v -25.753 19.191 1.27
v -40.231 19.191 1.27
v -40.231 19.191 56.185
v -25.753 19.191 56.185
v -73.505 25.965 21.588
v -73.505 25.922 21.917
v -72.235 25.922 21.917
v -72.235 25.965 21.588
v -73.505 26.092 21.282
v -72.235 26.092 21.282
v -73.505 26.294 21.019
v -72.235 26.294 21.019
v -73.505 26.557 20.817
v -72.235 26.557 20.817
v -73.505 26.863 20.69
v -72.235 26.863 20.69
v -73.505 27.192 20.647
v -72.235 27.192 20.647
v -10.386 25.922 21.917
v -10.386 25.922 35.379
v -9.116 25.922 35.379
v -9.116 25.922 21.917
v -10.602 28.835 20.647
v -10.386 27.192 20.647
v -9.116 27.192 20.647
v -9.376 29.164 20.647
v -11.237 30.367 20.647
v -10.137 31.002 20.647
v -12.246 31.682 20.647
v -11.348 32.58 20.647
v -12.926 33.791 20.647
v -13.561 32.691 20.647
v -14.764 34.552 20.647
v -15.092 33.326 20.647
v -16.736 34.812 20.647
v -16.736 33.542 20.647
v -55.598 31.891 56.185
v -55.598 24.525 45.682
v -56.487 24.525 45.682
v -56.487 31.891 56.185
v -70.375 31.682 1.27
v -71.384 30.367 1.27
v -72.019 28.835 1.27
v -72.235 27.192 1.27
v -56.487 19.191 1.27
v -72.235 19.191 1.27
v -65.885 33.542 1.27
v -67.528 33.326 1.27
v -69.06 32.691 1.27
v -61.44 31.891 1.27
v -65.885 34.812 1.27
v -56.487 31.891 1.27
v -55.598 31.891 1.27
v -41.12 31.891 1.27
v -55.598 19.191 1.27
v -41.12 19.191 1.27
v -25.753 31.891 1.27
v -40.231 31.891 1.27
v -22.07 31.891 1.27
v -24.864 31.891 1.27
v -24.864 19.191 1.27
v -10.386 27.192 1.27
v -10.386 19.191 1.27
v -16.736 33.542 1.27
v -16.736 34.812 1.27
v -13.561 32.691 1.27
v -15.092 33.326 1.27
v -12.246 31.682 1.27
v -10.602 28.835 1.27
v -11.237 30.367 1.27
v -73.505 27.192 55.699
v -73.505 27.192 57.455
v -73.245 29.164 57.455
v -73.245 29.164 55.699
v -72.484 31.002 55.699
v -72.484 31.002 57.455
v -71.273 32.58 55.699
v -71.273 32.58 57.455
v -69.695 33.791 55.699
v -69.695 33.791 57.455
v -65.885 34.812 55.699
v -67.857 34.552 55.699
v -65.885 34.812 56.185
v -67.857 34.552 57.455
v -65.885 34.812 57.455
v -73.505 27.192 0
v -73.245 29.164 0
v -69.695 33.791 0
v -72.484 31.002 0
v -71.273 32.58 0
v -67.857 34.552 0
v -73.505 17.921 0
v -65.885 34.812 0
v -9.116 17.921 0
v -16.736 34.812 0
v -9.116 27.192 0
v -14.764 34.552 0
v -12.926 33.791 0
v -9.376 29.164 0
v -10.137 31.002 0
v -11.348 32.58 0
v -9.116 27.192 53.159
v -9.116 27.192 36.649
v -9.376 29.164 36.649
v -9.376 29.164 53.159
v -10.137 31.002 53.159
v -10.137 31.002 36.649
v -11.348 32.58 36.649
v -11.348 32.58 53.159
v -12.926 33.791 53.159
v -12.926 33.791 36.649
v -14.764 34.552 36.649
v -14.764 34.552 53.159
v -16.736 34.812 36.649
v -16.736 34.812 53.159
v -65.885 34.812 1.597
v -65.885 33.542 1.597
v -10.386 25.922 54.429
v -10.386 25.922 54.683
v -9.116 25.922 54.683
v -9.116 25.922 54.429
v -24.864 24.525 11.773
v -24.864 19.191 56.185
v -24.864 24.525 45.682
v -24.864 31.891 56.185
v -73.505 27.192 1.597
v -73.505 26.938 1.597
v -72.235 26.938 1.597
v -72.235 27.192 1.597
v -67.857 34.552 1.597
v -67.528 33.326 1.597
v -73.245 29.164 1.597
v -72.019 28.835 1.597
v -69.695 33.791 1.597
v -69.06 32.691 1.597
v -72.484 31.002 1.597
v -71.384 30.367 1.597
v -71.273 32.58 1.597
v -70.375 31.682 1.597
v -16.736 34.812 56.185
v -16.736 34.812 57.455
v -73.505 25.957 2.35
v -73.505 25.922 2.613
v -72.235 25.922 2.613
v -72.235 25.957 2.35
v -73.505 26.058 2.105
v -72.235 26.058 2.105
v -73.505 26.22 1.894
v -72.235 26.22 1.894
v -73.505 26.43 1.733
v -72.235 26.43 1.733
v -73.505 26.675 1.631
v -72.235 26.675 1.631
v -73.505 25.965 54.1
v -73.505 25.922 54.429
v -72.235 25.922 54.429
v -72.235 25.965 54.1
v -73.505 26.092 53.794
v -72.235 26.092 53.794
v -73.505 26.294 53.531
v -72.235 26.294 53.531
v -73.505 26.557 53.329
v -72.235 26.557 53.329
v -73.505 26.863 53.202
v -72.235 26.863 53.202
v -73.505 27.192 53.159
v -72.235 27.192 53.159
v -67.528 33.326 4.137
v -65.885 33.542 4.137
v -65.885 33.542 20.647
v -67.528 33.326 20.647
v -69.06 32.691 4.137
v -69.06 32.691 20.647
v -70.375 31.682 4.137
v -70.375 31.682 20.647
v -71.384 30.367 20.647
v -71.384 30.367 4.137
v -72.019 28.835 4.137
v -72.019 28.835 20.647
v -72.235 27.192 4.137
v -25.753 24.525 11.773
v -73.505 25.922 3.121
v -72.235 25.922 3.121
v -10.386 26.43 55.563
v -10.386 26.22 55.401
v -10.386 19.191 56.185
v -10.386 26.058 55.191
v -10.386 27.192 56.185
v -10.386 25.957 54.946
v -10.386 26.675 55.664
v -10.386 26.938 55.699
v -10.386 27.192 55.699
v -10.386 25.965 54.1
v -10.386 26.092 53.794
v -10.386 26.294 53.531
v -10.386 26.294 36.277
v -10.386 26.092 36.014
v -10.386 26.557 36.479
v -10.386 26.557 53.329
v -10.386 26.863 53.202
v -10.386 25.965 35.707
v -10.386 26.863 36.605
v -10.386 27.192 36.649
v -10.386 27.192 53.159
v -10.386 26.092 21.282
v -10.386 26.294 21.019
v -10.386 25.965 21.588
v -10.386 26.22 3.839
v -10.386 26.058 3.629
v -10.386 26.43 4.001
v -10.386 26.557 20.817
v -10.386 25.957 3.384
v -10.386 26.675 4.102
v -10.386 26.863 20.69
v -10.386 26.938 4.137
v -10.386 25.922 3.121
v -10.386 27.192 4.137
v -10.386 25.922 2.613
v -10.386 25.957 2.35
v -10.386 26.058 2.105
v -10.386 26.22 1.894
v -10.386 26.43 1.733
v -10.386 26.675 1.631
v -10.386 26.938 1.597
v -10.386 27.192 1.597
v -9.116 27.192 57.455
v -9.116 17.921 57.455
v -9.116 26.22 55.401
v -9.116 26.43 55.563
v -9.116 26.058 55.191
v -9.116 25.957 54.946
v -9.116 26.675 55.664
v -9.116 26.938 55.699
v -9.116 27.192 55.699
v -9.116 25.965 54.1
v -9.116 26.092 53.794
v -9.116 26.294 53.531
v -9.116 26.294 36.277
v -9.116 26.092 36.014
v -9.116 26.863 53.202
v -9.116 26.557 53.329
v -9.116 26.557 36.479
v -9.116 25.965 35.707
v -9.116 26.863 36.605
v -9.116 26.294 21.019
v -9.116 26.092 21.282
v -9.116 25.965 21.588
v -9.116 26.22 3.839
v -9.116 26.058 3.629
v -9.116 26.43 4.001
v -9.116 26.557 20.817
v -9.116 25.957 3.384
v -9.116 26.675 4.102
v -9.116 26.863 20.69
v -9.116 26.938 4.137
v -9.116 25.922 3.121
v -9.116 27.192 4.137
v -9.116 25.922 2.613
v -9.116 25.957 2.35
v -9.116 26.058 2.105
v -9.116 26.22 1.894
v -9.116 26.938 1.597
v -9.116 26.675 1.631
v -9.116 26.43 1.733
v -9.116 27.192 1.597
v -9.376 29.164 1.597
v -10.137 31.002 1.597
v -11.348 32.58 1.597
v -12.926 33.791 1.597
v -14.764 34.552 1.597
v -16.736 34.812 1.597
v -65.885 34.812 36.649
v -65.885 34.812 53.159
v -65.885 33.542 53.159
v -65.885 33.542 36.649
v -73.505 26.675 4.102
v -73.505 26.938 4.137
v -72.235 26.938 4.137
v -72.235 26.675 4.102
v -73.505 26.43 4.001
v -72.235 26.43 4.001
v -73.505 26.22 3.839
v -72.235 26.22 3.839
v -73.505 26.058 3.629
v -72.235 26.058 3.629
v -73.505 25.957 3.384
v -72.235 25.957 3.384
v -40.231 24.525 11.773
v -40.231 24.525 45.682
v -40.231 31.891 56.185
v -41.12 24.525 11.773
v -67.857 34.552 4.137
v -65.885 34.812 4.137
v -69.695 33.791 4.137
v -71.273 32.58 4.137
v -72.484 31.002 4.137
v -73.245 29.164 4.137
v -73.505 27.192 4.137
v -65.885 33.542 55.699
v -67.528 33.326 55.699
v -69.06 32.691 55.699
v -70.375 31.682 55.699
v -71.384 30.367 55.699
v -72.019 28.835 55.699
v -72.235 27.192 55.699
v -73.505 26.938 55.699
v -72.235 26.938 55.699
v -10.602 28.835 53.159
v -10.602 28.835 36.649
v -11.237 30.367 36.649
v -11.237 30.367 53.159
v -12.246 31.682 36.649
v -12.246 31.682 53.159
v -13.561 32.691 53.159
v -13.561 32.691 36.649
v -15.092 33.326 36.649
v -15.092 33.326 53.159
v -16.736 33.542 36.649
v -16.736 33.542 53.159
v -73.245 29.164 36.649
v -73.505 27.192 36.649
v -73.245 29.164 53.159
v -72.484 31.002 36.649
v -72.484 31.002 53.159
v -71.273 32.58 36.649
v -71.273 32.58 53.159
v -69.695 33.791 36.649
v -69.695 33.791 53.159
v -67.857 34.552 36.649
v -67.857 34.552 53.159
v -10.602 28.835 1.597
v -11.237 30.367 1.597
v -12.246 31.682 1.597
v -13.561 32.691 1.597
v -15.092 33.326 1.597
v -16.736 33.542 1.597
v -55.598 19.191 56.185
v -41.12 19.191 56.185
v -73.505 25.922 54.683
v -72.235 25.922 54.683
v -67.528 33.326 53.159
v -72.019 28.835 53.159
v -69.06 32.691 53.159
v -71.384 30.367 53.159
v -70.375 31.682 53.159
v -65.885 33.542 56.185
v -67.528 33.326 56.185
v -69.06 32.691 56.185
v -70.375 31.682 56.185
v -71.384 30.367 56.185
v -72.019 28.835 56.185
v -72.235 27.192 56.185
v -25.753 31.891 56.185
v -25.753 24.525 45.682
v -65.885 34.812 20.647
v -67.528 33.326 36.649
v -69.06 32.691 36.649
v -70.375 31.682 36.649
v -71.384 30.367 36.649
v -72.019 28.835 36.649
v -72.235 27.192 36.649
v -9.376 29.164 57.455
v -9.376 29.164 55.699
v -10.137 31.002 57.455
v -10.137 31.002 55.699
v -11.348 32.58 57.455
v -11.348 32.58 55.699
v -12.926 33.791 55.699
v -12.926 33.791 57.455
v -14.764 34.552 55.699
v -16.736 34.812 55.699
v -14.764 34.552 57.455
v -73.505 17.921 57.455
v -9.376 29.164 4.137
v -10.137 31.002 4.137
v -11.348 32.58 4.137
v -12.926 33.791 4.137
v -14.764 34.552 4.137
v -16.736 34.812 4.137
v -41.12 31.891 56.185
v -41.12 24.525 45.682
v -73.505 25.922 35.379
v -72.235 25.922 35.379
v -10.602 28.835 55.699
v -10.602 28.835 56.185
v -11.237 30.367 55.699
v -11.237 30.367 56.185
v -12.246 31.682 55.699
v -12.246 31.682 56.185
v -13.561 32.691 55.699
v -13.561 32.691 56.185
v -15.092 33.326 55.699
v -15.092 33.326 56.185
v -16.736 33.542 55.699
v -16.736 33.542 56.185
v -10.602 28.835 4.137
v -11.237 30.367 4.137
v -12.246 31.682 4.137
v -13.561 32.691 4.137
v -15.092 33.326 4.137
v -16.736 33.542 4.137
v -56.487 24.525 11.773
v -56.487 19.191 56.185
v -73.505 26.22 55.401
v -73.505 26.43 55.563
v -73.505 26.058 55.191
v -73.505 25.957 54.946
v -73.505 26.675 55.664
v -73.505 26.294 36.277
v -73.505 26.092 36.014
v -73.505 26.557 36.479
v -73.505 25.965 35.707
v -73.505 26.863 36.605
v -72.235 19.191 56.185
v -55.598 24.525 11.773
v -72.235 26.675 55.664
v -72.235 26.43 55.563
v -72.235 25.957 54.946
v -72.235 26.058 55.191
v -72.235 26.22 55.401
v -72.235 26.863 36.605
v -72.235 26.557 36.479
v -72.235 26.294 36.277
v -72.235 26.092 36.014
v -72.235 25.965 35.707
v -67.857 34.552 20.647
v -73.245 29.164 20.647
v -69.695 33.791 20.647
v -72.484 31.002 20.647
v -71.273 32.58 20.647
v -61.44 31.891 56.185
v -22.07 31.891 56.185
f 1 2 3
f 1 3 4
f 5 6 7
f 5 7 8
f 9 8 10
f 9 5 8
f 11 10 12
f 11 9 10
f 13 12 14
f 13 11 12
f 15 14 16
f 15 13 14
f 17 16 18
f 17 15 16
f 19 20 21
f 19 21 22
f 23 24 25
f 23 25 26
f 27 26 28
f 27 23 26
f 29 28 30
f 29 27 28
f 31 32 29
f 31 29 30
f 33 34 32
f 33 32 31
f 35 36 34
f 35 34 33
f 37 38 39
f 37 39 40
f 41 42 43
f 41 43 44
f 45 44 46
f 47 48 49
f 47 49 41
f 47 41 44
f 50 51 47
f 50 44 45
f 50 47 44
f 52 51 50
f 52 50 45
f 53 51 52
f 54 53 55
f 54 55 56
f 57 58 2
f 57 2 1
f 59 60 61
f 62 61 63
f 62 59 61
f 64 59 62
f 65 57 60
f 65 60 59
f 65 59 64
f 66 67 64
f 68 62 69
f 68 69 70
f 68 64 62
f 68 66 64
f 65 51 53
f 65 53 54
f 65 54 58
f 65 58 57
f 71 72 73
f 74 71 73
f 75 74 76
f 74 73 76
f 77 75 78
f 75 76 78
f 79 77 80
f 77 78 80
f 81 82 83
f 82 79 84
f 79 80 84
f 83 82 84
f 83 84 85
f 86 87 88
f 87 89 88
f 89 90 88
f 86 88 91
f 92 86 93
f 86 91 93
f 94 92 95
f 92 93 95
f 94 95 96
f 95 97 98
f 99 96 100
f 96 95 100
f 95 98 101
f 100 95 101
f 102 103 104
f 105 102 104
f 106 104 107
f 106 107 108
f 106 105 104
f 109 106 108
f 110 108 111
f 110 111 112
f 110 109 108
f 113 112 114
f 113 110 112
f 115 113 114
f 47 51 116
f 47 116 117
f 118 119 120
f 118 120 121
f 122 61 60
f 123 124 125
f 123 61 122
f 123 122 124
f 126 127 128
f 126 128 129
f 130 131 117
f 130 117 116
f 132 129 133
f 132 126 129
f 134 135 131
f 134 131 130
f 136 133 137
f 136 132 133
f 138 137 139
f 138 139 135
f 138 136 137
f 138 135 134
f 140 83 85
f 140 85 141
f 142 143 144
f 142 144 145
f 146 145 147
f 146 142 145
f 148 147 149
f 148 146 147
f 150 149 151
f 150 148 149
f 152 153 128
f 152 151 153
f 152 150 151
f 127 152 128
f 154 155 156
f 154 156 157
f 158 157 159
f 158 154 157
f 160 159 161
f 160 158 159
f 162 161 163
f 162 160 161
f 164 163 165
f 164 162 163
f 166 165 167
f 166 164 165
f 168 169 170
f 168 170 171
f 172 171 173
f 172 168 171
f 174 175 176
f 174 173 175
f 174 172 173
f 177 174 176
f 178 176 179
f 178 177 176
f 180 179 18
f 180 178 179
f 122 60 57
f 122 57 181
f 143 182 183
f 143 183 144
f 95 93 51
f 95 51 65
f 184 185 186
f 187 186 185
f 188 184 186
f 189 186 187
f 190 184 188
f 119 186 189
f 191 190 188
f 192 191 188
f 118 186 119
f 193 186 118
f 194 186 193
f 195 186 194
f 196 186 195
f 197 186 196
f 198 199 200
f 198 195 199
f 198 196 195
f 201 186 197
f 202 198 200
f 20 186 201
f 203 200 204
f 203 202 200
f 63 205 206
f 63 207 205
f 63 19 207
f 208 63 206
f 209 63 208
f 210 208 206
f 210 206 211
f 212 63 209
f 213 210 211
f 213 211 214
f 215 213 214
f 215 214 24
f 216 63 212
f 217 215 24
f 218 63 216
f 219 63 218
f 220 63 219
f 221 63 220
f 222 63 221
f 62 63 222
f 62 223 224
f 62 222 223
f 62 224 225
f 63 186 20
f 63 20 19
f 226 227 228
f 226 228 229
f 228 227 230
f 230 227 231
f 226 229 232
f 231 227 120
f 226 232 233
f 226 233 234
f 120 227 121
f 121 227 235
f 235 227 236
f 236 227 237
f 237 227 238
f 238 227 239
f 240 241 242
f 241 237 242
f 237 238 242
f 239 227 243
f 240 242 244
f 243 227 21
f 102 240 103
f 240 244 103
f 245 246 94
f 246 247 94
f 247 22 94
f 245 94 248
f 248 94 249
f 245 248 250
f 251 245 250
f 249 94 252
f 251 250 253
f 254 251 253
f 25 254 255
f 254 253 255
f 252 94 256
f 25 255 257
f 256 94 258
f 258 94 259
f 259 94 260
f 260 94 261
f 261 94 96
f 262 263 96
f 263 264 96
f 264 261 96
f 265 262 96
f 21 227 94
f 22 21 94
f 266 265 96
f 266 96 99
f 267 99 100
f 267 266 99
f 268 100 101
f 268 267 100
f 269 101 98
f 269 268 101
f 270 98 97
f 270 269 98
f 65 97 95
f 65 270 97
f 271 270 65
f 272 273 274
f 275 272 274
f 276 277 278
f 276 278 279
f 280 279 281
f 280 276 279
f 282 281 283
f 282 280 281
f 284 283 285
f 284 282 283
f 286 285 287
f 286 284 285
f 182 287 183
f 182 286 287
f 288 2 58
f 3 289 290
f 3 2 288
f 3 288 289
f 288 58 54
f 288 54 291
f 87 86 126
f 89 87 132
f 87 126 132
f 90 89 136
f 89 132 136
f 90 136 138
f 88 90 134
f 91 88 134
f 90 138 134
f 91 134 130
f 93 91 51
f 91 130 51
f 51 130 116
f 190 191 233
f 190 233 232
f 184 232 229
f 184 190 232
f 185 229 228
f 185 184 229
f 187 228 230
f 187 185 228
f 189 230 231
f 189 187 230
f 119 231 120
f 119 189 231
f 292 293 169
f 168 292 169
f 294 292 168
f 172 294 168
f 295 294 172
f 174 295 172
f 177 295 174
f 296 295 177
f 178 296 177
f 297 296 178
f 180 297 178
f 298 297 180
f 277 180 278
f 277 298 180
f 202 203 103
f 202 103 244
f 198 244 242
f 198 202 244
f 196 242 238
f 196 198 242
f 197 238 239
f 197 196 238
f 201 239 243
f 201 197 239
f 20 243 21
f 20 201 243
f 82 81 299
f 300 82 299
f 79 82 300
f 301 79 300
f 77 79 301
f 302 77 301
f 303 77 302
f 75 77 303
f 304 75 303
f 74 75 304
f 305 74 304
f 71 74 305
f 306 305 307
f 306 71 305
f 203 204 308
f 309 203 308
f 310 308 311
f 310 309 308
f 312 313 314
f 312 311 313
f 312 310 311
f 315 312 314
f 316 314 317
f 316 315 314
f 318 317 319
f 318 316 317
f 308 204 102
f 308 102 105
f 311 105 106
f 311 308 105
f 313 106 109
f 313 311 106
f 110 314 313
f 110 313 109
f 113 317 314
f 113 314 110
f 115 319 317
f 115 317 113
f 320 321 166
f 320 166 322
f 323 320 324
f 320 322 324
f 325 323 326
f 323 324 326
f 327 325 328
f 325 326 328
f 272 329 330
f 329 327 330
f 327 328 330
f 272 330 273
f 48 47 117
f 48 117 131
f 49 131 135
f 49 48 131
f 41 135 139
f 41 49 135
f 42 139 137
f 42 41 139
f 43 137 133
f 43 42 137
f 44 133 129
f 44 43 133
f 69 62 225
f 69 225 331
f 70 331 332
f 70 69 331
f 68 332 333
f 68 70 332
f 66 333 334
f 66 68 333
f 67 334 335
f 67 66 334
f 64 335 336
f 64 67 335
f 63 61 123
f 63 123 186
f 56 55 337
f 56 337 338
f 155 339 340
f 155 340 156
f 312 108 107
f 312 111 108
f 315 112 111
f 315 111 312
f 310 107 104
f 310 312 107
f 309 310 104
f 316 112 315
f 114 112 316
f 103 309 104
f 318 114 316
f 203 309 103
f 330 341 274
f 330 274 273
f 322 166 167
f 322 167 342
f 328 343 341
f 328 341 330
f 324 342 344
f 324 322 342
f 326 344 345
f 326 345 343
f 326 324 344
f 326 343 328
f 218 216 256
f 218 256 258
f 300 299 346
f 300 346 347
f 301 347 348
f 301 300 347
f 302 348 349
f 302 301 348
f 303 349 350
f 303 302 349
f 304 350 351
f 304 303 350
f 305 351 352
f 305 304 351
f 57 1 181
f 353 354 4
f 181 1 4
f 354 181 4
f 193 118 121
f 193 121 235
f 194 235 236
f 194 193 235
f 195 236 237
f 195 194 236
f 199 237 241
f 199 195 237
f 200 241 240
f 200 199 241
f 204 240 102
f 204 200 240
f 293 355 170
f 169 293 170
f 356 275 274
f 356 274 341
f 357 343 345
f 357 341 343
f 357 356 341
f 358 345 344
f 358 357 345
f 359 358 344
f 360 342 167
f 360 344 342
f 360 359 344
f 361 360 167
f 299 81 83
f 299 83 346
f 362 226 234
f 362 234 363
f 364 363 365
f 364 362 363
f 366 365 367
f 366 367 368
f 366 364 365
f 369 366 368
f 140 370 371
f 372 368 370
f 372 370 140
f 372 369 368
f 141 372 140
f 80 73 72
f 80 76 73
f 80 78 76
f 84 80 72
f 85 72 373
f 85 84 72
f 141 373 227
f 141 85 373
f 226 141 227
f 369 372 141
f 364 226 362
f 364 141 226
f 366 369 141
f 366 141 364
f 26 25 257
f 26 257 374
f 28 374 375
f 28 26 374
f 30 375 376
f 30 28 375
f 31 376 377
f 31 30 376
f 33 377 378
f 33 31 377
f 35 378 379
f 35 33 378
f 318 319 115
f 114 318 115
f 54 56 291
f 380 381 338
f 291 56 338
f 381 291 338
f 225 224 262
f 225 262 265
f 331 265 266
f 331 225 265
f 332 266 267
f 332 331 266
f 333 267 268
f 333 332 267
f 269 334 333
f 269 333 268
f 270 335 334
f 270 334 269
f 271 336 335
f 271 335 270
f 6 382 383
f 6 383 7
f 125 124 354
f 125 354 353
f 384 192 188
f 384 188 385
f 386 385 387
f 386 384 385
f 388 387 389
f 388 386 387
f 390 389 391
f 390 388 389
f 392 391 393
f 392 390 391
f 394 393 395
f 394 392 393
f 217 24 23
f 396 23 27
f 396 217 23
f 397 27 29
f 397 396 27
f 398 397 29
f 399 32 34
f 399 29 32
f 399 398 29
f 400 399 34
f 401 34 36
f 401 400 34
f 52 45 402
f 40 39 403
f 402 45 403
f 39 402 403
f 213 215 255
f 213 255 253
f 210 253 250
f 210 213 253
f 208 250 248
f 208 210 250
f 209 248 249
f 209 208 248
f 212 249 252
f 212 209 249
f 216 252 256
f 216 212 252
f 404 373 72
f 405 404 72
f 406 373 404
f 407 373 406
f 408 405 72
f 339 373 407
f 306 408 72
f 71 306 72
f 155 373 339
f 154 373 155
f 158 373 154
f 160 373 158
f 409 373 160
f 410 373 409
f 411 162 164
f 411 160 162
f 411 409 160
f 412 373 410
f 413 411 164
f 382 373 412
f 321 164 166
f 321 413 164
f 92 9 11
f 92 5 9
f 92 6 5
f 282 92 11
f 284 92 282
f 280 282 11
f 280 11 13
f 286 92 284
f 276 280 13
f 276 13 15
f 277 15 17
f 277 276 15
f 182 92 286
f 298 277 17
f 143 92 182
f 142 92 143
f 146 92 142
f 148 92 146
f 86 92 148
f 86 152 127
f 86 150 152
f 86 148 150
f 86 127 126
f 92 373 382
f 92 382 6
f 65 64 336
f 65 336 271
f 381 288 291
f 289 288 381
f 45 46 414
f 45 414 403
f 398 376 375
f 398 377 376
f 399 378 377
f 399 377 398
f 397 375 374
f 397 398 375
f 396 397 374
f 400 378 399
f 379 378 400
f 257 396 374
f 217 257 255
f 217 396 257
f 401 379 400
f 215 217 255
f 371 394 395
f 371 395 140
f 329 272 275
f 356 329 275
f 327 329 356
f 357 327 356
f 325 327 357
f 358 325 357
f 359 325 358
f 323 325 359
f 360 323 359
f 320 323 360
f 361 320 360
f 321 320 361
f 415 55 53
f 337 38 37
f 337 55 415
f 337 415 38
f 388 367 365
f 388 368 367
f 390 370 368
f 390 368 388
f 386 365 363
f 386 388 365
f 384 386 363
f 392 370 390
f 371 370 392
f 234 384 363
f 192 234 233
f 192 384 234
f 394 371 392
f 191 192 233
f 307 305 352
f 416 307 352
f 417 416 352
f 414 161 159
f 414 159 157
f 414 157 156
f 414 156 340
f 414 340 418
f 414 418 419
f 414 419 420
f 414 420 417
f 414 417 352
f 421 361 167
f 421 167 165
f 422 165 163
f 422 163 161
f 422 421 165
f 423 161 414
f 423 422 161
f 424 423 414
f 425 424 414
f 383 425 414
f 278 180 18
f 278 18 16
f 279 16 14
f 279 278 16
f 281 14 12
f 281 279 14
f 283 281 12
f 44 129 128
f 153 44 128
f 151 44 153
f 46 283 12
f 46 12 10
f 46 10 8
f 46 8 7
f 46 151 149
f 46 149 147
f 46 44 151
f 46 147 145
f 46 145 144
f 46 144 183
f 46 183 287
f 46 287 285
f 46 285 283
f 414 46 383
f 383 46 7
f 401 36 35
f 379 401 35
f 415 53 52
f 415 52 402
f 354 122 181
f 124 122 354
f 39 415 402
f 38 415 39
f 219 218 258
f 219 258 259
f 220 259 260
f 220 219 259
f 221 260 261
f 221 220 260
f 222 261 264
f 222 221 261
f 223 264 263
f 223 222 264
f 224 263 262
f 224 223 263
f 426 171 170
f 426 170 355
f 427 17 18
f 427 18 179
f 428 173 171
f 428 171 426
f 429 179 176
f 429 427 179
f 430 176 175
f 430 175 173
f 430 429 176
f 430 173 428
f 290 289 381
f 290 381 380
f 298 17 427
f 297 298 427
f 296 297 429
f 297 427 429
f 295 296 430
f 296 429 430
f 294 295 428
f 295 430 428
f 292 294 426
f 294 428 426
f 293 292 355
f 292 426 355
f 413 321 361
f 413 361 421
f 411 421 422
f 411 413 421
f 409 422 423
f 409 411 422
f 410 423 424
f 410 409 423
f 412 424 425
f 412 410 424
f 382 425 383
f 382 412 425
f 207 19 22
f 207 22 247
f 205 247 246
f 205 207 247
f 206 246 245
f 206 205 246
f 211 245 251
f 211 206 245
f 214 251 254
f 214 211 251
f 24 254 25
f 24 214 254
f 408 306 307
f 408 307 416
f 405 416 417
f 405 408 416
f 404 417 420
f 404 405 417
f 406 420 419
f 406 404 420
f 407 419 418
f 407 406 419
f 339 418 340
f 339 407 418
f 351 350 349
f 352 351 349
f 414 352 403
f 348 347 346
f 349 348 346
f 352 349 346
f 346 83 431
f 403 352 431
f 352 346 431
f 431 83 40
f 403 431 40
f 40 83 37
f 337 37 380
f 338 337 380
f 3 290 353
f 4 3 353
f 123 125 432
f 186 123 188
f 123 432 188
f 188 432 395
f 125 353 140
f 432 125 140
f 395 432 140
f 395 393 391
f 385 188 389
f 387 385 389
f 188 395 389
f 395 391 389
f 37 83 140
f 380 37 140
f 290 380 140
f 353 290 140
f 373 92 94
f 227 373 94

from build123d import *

# Parameters (mm, degrees)
SKETCH1_W               = 64.389
SKETCH1_H               = 16.891
EXTRUDE1_DEPTH          = 57.4548
FILLET2_R               = 7.62
SHELL1_START            = 1.27
SHELL1_DEPTH            = 54.9148
CUT_EXTRUDE1_DEPTH      = 100.578641885
CUT_EXTRUDE1_DEPTH_BACK = 100.578641885
SKETCH4_W               = 0.889
SKETCH4_H               = 54.9148
EXTRUDE2_DEPTH          = 12.7
CUT_EXTRUDE2_DEPTH      = 20.32
CUT_EXTRUDE2_DEPTH_BACK = 19.05


# Read off the part's stored shape, not the designer's step: Shell1
with BuildPart() as part:
    # Sketch1 → Extrude1 (new body)
    with BuildSketch(Plane.XY):
        with Locations((-41.310464395, 26.366453204)):
            Rectangle(SKETCH1_W, SKETCH1_H)
    extrude(amount=EXTRUDE1_DEPTH)

    # Fillet2
    fillet2_edges = [part.edges().sort_by_distance(p)[0] for p in [
        (-73.504964395, 34.811953204, 28.7274),
        (-9.115964395, 34.811953204, 28.7274),
    ]]
    fillet(fillet2_edges, radius=FILLET2_R)

    # Shell1 outline → Shell1 (cut)
    with BuildSketch(Plane.XY.offset(SHELL1_START)):
        with BuildLine():
            Line((-16.735964395, 33.541953204), (-16.735964395, 34.811953204))
            Line((-16.735964395, 34.811953204), (-65.884964395, 34.811953204))
            Line((-65.884964395, 34.811953204), (-65.884964395, 33.541953204))
            ThreePointArc((-65.884964395, 33.541953204), (-70.375092455, 31.682081264), (-72.234964395, 27.191953204))
            Line((-72.234964395, 27.191953204), (-72.234964395, 19.190953204))
            Line((-72.234964395, 19.190953204), (-10.385964395, 19.190953204))
            Line((-10.385964395, 19.190953204), (-10.385964395, 27.191953204))
            ThreePointArc((-10.385964395, 27.191953204), (-12.245836334, 31.682081265), (-16.735964395, 33.541953204))
        make_face()
    extrude(amount=SHELL1_DEPTH, mode=Mode.SUBTRACT)

    # Sketch2 → Cut-Extrude1 (cut, two sides: drawn at the far end of the back side and taken through both)
    with BuildSketch(Plane(origin=(0, 0, 0), x_dir=(0, 0, -1), z_dir=(1, 0, 0)).offset(-CUT_EXTRUDE1_DEPTH_BACK)):
        with BuildLine():
            Line((-189.674707518, 34.811953204), (-58.293, 34.811953204))
            Line((-58.293, 34.811953204), (-55.698725793, 34.811953204))
            Line((-55.698725793, 34.811953204), (-55.698725793, 26.937953204))
            ThreePointArc((-55.698725793, 26.937953204), (-55.401146283, 26.219532715), (-54.682725793, 25.921953204))
            Line((-54.682725793, 25.921953204), (-54.428725793, 25.921953204))
            ThreePointArc((-54.428725793, 25.921953204), (-53.530700181, 26.293927592), (-53.158725793, 27.191953204))
            Line((-53.158725793, 27.191953204), (-53.158725793, 34.811953204))
            Line((-53.158725793, 34.811953204), (-36.648725793, 34.811953204))
            Line((-36.648725793, 34.811953204), (-36.648725793, 27.191953204))
            ThreePointArc((-36.648725793, 27.191953204), (-36.276751405, 26.293927592), (-35.378725793, 25.921953204))
            Line((-35.378725793, 25.921953204), (-21.916725793, 25.921953204))
            ThreePointArc((-21.916725793, 25.921953204), (-21.018700181, 26.293927592), (-20.646725793, 27.191953204))
            Line((-20.646725793, 27.191953204), (-20.646725793, 34.811953204))
            Line((-20.646725793, 34.811953204), (-4.136725793, 34.811953204))
            Line((-4.136725793, 34.811953204), (-4.136725793, 26.937953204))
            ThreePointArc((-4.136725793, 26.937953204), (-3.839146283, 26.219532715), (-3.120725793, 25.921953204))
            Line((-3.120725793, 25.921953204), (-2.612725793, 25.921953204))
            ThreePointArc((-2.612725793, 25.921953204), (-1.894305303, 26.219532715), (-1.596725793, 26.937953204))
            Line((-1.596725793, 26.937953204), (-1.596725793, 34.811953204))
            Line((-1.596725793, 34.811953204), (0, 34.811953204))
            Line((0, 34.811953204), (131.381707518, 34.811953204))
            Line((131.381707518, 34.811953204), (131.381707518, 297.575368241))
            Line((131.381707518, 297.575368241), (-189.674707518, 297.575368241))
            Line((-189.674707518, 297.575368241), (-189.674707518, 34.811953204))
        make_face()
    extrude(amount=CUT_EXTRUDE1_DEPTH + CUT_EXTRUDE1_DEPTH_BACK, mode=Mode.SUBTRACT)

    # Sketch4 → Extrude2 (add)
    with BuildSketch(Plane(origin=(0, 19.190953204, 0), x_dir=(-1, 0, 0), z_dir=(0, 1, 0))):
        with Locations((40.675464395, 28.7274)):
            Rectangle(SKETCH4_W, SKETCH4_H)
        with Locations((25.308464395, 28.7274)):
            Rectangle(SKETCH4_W, SKETCH4_H)
        with Locations((56.042464395, 28.7274)):
            Rectangle(SKETCH4_W, SKETCH4_H)
    extrude(amount=EXTRUDE2_DEPTH)

    # Sketch5 → Cut-Extrude2 (cut, two sides: drawn at the far end of the back side and taken through both)
    with BuildSketch(Plane.ZY.offset(41.119964395).offset(-CUT_EXTRUDE2_DEPTH_BACK)):
        Polygon((1.27, 31.890953204), (11.7729, 24.524953204), (45.6819, 24.524953204), (56.1848, 31.890953204), align=None)
    extrude(amount=CUT_EXTRUDE2_DEPTH + CUT_EXTRUDE2_DEPTH_BACK, mode=Mode.SUBTRACT)


solid = part.part
